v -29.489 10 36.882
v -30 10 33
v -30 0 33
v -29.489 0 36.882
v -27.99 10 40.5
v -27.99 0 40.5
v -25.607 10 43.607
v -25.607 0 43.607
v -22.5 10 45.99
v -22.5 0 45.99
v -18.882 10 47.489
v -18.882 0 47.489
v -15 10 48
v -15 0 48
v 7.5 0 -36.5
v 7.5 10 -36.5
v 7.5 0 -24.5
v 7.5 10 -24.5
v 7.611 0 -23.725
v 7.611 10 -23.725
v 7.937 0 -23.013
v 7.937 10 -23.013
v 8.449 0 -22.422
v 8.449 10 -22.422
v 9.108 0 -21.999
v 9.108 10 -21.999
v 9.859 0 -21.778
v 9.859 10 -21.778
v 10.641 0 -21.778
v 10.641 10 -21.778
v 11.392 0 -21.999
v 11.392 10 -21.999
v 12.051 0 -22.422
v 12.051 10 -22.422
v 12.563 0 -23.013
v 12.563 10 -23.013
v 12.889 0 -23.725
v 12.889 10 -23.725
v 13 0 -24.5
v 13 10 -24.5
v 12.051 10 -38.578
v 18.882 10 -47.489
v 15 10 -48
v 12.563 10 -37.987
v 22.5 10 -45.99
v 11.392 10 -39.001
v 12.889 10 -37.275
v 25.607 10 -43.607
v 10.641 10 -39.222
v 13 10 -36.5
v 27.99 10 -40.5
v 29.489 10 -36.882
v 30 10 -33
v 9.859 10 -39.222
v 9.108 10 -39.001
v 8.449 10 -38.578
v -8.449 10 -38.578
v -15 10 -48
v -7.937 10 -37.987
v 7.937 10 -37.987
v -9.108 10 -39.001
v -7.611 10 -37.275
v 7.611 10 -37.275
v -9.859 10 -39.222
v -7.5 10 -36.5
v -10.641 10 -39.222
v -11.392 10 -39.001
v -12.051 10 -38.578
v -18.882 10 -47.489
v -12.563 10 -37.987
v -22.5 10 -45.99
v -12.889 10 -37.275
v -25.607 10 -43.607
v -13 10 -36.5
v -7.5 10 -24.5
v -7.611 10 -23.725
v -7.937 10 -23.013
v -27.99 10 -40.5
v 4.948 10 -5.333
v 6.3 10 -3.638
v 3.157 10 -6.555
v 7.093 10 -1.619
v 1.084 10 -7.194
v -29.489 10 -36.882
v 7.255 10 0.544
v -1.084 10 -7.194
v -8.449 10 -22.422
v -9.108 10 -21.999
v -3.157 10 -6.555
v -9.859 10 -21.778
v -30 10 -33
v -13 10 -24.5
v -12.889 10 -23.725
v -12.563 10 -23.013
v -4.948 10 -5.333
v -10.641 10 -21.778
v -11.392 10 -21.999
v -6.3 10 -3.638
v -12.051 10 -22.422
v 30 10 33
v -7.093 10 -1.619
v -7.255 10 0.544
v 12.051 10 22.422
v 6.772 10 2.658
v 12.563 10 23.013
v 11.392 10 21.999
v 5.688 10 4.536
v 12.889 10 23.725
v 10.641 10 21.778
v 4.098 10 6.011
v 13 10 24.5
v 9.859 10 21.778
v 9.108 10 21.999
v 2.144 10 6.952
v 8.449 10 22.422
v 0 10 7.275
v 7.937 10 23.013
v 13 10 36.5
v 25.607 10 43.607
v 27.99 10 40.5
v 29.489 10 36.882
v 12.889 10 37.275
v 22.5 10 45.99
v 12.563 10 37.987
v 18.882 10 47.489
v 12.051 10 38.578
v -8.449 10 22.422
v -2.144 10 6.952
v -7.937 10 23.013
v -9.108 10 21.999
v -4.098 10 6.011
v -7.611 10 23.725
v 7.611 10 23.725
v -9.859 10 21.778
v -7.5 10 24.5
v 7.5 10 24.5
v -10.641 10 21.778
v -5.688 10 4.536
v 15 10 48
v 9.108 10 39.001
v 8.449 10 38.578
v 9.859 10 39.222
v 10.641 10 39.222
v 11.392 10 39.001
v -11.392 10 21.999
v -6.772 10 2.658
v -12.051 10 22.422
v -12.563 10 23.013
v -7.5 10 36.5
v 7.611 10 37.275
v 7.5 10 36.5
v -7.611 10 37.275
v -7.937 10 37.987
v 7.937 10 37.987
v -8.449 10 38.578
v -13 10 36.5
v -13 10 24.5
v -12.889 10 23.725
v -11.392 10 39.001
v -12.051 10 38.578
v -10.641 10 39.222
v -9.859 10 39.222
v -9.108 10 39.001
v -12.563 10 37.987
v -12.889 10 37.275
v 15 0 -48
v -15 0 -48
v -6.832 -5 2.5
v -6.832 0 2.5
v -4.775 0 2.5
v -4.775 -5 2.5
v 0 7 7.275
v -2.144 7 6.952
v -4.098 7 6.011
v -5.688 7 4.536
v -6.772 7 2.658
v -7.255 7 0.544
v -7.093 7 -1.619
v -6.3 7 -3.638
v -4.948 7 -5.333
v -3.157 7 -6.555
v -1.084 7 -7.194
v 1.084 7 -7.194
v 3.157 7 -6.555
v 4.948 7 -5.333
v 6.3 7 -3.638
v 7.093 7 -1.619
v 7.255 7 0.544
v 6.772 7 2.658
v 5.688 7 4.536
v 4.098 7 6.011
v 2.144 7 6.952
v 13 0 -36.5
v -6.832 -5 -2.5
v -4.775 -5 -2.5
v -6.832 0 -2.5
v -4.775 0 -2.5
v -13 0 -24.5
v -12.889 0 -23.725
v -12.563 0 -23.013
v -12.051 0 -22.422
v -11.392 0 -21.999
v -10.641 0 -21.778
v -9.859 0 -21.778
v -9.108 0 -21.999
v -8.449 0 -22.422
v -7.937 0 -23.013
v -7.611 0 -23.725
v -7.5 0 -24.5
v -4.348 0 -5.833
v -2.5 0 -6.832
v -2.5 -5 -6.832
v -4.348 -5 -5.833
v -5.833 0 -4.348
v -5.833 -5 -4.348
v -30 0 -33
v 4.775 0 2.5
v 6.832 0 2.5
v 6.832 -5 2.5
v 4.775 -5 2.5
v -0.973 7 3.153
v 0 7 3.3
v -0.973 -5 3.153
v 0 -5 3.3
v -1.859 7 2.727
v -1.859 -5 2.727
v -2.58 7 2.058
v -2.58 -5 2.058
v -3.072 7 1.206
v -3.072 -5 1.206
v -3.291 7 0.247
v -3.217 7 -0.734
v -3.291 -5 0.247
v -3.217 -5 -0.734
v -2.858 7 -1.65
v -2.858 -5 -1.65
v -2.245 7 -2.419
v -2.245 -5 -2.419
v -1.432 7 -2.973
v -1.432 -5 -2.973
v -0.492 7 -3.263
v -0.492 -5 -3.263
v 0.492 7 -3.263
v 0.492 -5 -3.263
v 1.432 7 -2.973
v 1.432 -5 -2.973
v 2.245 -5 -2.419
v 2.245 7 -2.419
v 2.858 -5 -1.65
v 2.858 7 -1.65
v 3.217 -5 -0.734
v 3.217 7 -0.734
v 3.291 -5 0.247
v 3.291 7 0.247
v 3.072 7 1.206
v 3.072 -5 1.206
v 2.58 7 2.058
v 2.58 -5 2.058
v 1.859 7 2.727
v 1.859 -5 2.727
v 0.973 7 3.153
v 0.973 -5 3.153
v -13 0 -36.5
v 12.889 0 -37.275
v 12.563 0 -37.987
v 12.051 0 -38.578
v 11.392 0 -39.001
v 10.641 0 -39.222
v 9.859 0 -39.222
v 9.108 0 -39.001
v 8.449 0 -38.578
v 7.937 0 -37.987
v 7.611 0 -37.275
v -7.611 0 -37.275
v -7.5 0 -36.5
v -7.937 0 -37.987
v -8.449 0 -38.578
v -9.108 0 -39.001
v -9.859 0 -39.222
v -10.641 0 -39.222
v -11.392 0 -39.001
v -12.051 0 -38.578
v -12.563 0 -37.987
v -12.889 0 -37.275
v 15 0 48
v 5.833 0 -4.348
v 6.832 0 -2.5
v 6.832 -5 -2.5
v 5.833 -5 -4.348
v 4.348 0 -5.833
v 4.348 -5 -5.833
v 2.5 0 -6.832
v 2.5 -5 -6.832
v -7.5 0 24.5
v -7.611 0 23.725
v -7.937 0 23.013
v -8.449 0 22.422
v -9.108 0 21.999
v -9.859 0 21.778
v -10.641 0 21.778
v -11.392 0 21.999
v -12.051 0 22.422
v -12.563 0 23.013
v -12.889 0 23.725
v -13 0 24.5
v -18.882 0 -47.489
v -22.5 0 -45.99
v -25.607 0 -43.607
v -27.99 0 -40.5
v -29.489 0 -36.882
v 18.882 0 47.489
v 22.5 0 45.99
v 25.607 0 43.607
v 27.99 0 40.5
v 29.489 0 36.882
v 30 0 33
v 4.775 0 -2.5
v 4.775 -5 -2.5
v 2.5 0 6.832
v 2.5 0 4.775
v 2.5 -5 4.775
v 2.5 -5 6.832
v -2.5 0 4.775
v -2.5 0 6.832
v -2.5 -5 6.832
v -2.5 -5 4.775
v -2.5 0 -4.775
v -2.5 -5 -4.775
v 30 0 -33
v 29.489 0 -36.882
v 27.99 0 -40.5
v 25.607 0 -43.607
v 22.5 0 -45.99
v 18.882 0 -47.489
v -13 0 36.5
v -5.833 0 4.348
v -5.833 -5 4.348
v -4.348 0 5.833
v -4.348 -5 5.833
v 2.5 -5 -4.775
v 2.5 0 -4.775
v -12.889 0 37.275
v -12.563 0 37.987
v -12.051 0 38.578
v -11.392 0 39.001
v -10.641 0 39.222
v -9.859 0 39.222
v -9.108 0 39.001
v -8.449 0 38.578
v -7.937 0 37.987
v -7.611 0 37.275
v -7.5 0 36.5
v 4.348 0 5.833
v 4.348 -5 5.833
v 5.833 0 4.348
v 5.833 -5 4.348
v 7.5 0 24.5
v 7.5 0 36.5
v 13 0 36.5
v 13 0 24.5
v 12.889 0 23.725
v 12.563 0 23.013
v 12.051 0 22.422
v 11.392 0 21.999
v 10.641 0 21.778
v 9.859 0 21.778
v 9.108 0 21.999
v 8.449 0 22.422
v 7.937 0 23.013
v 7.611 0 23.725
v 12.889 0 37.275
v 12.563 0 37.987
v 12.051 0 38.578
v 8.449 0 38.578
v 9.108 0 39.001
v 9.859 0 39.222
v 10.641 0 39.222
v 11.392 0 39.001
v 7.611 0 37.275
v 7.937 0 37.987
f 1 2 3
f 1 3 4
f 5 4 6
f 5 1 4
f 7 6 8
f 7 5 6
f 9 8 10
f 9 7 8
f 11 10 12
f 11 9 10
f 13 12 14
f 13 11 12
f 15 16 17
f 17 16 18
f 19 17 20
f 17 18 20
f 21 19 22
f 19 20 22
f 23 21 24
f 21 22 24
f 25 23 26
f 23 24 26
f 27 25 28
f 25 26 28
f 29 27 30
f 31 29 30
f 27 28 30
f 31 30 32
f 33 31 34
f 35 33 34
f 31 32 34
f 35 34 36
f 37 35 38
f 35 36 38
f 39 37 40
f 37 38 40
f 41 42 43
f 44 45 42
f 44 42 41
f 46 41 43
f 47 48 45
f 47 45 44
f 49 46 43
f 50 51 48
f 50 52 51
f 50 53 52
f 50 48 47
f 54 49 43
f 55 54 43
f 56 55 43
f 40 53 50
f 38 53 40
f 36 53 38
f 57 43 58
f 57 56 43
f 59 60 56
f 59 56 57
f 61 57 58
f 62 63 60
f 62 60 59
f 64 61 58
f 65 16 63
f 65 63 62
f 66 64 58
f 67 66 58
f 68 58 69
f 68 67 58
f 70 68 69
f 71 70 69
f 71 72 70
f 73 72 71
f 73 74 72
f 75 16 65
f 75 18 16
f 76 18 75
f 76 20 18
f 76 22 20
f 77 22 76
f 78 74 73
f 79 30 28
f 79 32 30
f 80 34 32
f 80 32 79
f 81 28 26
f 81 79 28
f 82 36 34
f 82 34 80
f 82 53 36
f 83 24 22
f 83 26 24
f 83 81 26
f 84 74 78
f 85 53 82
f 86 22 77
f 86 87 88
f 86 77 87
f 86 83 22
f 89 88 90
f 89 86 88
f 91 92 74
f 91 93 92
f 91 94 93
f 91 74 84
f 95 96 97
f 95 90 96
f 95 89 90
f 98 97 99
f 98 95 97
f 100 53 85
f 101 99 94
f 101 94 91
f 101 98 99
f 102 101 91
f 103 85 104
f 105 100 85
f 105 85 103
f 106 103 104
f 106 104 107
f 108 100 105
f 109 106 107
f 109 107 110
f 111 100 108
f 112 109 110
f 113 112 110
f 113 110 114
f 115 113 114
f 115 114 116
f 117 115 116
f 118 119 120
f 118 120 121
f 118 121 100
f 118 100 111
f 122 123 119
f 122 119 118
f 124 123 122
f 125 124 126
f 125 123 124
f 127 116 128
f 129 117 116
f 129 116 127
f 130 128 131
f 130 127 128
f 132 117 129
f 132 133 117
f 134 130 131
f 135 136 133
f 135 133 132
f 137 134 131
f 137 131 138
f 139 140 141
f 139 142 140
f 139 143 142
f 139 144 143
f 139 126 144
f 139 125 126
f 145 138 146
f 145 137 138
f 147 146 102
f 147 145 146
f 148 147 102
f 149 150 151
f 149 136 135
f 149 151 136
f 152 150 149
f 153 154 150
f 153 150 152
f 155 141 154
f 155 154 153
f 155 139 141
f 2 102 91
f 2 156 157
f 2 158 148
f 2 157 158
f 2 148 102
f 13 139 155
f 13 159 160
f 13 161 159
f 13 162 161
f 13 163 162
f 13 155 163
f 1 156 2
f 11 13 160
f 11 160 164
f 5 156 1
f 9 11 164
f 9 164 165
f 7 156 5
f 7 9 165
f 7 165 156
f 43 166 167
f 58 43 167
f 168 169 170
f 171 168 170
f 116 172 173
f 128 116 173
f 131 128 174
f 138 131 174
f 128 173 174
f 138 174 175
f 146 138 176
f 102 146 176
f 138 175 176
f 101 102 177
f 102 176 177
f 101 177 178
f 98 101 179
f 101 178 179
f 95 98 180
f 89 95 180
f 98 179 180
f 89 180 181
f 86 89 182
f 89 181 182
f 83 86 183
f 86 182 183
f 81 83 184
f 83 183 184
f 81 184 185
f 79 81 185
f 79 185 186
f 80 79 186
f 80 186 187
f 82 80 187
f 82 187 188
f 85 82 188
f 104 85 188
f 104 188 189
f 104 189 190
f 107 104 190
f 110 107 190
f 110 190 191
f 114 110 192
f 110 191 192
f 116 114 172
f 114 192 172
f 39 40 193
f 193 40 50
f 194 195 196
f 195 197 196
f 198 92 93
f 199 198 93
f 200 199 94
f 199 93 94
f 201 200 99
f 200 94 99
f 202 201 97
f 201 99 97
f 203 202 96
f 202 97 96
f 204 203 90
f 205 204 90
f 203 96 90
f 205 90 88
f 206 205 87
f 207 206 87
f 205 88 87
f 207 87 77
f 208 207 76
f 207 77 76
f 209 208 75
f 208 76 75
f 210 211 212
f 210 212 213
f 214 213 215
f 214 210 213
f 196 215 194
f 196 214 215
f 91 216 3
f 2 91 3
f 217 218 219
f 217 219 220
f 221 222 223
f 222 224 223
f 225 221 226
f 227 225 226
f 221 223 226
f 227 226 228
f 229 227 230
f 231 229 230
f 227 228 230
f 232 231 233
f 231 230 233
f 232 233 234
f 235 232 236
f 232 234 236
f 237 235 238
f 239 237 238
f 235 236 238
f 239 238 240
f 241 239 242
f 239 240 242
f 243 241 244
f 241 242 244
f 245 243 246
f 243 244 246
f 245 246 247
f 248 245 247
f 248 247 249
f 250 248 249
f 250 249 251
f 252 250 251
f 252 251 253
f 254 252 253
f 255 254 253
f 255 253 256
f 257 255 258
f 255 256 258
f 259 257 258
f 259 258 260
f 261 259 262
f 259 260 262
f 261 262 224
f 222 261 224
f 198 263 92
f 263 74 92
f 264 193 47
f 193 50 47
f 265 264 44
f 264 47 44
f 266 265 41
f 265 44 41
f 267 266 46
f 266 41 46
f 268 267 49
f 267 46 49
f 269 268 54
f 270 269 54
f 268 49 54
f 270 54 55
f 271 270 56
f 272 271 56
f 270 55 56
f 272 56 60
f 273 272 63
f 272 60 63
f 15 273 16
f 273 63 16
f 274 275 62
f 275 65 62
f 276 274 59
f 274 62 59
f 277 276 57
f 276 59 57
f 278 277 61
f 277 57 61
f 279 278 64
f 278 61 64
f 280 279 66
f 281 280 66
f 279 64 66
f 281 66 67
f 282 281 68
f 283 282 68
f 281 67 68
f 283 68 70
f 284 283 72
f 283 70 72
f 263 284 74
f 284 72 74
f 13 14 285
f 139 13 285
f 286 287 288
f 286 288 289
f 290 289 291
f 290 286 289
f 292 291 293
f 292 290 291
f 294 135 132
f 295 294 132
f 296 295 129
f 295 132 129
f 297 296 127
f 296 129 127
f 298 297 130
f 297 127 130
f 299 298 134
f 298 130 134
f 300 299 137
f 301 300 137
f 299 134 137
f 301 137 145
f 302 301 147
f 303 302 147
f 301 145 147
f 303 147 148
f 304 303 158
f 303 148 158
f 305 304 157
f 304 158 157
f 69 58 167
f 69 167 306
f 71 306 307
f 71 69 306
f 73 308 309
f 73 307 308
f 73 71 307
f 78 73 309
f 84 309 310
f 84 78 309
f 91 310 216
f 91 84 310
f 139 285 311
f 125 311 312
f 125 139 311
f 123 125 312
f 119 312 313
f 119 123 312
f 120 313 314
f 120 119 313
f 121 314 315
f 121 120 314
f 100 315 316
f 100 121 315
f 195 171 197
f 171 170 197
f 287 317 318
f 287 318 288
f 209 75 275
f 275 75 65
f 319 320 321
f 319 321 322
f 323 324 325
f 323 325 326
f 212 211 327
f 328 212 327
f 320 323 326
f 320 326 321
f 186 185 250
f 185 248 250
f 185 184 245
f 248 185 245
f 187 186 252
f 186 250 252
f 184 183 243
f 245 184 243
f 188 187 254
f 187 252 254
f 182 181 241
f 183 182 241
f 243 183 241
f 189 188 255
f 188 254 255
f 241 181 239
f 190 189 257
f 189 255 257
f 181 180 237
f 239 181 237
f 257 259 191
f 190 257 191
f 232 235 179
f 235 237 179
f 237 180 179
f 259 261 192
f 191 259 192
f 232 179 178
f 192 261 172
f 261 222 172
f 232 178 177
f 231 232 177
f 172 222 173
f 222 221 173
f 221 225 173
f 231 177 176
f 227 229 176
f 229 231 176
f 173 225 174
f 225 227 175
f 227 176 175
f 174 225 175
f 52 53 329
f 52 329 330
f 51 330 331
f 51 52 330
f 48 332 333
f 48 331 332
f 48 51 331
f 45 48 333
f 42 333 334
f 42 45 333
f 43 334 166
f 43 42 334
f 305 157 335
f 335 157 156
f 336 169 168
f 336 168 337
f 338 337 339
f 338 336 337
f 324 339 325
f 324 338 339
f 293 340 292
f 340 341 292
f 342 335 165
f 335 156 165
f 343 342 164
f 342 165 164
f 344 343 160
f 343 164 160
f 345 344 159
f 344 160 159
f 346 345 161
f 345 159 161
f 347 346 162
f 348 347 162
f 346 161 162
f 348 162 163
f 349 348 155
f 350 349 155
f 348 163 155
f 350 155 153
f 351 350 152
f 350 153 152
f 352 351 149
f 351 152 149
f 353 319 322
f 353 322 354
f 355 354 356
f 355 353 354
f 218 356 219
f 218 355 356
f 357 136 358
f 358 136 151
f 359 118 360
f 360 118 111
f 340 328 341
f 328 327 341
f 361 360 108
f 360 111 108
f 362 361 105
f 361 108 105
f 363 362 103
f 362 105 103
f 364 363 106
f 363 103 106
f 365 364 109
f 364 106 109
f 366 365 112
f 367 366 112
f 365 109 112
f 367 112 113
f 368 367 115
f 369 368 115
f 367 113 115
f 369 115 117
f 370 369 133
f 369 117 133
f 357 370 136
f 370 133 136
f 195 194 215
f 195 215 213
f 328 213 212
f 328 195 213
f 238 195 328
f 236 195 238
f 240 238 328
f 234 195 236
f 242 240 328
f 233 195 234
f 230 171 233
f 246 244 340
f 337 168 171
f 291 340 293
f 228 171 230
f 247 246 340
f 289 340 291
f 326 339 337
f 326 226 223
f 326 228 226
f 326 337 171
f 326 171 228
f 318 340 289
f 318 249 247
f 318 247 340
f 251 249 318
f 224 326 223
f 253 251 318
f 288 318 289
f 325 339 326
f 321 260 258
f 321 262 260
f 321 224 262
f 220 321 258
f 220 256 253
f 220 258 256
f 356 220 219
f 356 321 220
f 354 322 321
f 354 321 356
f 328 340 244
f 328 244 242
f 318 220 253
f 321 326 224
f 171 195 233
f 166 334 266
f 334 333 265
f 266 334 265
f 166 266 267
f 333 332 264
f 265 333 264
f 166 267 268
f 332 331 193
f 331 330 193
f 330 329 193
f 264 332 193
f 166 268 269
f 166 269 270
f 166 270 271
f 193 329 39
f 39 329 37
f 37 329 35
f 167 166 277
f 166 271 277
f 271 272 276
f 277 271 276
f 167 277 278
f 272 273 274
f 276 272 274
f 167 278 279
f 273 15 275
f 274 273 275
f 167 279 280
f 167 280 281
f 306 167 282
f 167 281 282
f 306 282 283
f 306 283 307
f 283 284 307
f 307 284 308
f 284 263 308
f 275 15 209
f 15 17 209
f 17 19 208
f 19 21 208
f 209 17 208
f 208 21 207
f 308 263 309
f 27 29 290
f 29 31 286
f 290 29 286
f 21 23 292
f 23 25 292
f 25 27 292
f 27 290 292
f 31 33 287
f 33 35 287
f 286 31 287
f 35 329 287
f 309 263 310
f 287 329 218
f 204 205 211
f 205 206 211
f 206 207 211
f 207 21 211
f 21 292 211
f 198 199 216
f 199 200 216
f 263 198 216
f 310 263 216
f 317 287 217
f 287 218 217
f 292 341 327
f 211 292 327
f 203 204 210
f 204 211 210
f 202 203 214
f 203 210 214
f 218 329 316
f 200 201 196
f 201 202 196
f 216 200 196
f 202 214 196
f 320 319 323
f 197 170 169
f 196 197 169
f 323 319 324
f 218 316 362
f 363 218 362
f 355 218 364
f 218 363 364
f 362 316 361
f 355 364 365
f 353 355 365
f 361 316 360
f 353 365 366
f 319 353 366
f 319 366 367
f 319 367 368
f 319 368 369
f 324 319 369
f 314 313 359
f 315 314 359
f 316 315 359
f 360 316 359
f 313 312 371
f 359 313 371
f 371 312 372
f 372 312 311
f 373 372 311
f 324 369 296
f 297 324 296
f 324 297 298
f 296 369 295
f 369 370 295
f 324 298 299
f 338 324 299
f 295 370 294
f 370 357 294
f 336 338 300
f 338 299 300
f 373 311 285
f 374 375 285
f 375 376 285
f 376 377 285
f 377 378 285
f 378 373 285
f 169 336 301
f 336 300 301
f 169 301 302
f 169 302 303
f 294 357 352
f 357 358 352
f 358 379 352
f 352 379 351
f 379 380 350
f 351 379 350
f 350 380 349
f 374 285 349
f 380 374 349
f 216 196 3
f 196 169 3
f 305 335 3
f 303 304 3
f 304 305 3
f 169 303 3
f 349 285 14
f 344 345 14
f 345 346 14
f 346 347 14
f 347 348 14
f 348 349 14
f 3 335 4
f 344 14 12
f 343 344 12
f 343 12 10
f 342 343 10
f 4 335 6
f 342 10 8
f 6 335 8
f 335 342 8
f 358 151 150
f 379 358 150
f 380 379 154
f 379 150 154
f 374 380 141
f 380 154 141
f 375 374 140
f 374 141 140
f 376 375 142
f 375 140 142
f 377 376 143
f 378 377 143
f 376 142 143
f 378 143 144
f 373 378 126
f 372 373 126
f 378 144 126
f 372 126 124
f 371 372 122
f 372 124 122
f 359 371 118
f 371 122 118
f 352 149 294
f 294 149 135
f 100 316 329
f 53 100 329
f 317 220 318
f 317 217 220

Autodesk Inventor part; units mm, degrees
ref_plane "YZ Plane" through (0, 0, 0) normal (1, 0, 0) x (0, 1, 0)
ref_plane "XZ Plane" through (0, 0, 0) normal (0, 1, 0) x (-1, 0, 0)
ref_plane "XY Plane" through (0, 0, 0) normal (0, 0, 1) x (1, 0, 0)
sketch "Sketch1" plane through (0, 0, 0) normal (0, 1, 0) x (-1, 0, 0)
  line L0 (30, 48) -> (-30, 48)
  line L1 (-30, 48) -> (-30, -48)
  line L2 (-30, -48) -> (30, -48)
  line L3 (30, -48) -> (30, 48)
  line L4 (30, 48) -> (-30, -48) construction
  line L5 (-30, 48) -> (30, -48) construction
  point P0 (0, 0)
  dimension "d0" = 60
  dimension "d1" = 96
extrude "Extrusion1" add sketch "Sketch1" along normal blind 10
sketch "Sketch2" plane through (0, 10, 0) normal (0, 1, 0) x (1, 0, 0)
  line L0 (13, -30.5) -> (13, 30.5) construction
  line L1 (13, 30.5) -> (-13, 30.5) construction
  line L2 (-13, 30.5) -> (-13, -30.5) construction
  line L3 (-13, -30.5) -> (13, -30.5) construction
  line L4 (13, -30.5) -> (-13, 30.5) construction
  line L5 (13, 30.5) -> (-13, -30.5) construction
  line L6 (-13, -30.5) -> (-10.25, -30.5)
  line L7 (-13, 30.5) -> (-10.25, 30.5)
  line L8 (13, -30.5) -> (10.25, -30.5) construction
  line L9 (13, 30.5) -> (10.25, 30.5)
  line L10 (10.25, -36.5) -> (10.25, -24.5) construction
  line L11 (13, -36.5) -> (13, -24.5)
  line L12 (7.5, -24.5) -> (7.5, -36.5)
  arc A0 (7.5, -36.5) -> (13, -36.5) centre (10.25, -36.5) ccw
  arc A1 (13, -24.5) -> (7.5, -24.5) centre (10.25, -24.5) ccw
  arc A2 (-13, -36.5) -> (-7.5, -36.5) centre (-10.25, -36.5) ccw
  line L13 (-13, -24.5) -> (-13, -36.5)
  line L14 (-7.5, -36.5) -> (-7.5, -24.5)
  arc A3 (-7.5, -24.5) -> (-13, -24.5) centre (-10.25, -24.5) ccw
  arc A4 (7.5, 24.5) -> (13, 24.5) centre (10.25, 24.5) ccw
  line L15 (7.5, 36.5) -> (7.5, 24.5)
  line L16 (13, 24.5) -> (13, 36.5)
  arc A5 (13, 36.5) -> (7.5, 36.5) centre (10.25, 36.5) ccw
  arc A6 (-13, 24.5) -> (-7.5, 24.5) centre (-10.25, 24.5) ccw
  line L17 (-13, 36.5) -> (-13, 24.5)
  line L18 (-7.5, 24.5) -> (-7.5, 36.5)
  arc A7 (-7.5, 36.5) -> (-13, 36.5) centre (-10.25, 36.5) ccw
  point P0 (0, 0)
  point P1 (0, 0)
  point P2 (0, 0)
  dimension "d17" = 61
  dimension "d16" = 26
  dimension "d13" = 2.75
  dimension "d15" = 2.75
  dimension "d12" = 2.75
  dimension "d14" = 2.75
  dimension "d11" = 6
  dimension "d10" = 5.5
  dimension "d8" = 6
  dimension "d9" = 5.5
  dimension "d6" = 6
  dimension "d7" = 5.5
  dimension "d4" = 6
  dimension "d5" = 5.5
extrude "Extrusion2" cut sketch "Sketch2" against normal through all
sketch "Sketch3" plane through (0, 0, 0) normal (0, -1, 0) x (1, 0, 0)
  circle A0 centre (0, 0) radius 7.275
  line L0 (7.275, 0) -> (-7.275, 0) construction
  line L1 (0, 7.275) -> (0, -7.275) construction
  line L2 (9.775, 2.5) -> (4.775, 2.5)
  line L3 (4.775, 2.5) -> (4.775, -2.5)
  line L4 (4.775, -2.5) -> (9.775, -2.5)
  line L5 (9.775, -2.5) -> (9.775, 2.5)
  line L6 (9.775, 2.5) -> (4.775, -2.5) construction
  line L7 (4.775, 2.5) -> (9.775, -2.5) construction
  line L8 (2.5, 9.775) -> (-2.5, 9.775)
  line L9 (-2.5, 9.775) -> (-2.5, 4.775)
  line L10 (-2.5, 4.775) -> (2.5, 4.775)
  line L11 (2.5, 4.775) -> (2.5, 9.775)
  line L12 (2.5, 9.775) -> (-2.5, 4.775) construction
  line L13 (-2.5, 9.775) -> (2.5, 4.775) construction
  line L14 (-9.775, 2.5) -> (-4.775, 2.5)
  line L15 (-4.775, 2.5) -> (-4.775, -2.5)
  line L16 (-4.775, -2.5) -> (-9.775, -2.5)
  line L17 (-9.775, -2.5) -> (-9.775, 2.5)
  line L18 (-9.775, 2.5) -> (-4.775, -2.5) construction
  line L19 (-4.775, 2.5) -> (-9.775, -2.5) construction
  line L20 (-2.5, -4.775) -> (2.5, -4.775)
  line L21 (2.5, -4.775) -> (2.5, -9.775)
  line L22 (2.5, -9.775) -> (-2.5, -9.775)
  line L23 (-2.5, -9.775) -> (-2.5, -4.775)
  line L24 (-2.5, -4.775) -> (2.5, -9.775) construction
  line L25 (2.5, -4.775) -> (-2.5, -9.775) construction
  point P0 (6.832, 2.5)
  point P1 (2.5, 6.832)
  point P2 (-2.5, 6.832)
  point P3 (-6.832, 2.5)
  point P4 (-6.832, -2.5)
  point P5 (-2.5, -6.832)
  point P6 (2.5, -6.832)
  point P7 (6.832, -2.5)
  dimension "d29" = 14.55
  dimension "d27" = 5
  dimension "d28" = 5
  dimension "d25" = 5
  dimension "d26" = 5
  dimension "d23" = 5
  dimension "d24" = 5
  dimension "d21" = 5
  dimension "d22" = 5
extrude "Extrusion3" add sketch "Sketch3" along normal blind 5 contours L2 L3 L4 A0 L21 L20 L23 L16 L15 L14 L9 L10 L11
sketch "Sketch4" plane through (0, 10, 0) normal (0, 1, 0) x (1, 0, 0)
  line L0 (13, -30.5) -> (13, 30.5) construction
  line L1 (13, 30.5) -> (-13, 30.5) construction
  line L2 (-13, 30.5) -> (-13, -30.5) construction
  line L3 (-13, -30.5) -> (13, -30.5) construction
  line L4 (13, -30.5) -> (-13, 30.5) construction
  line L5 (13, 30.5) -> (-13, -30.5) construction
  line L6 (-13, -30.5) -> (-10.25, -30.5)
  line L7 (-13, 30.5) -> (-10.25, 30.5)
  line L8 (13, -30.5) -> (10.25, -30.5) construction
  line L9 (13, 30.5) -> (10.25, 30.5)
  line L10 (10.25, -36.5) -> (10.25, -24.5) construction
  line L11 (13, -36.5) -> (13, -24.5)
  line L12 (7.5, -24.5) -> (7.5, -36.5)
  arc A0 (7.5, -36.5) -> (13, -36.5) centre (10.25, -36.5) ccw
  arc A1 (13, -24.5) -> (7.5, -24.5) centre (10.25, -24.5) ccw
  arc A2 (-13, -36.5) -> (-7.5, -36.5) centre (-10.25, -36.5) ccw
  line L13 (-13, -24.5) -> (-13, -36.5)
  line L14 (-7.5, -36.5) -> (-7.5, -24.5)
  arc A3 (-7.5, -24.5) -> (-13, -24.5) centre (-10.25, -24.5) ccw
  arc A4 (7.5, 24.5) -> (13, 24.5) centre (10.25, 24.5) ccw
  line L15 (7.5, 36.5) -> (7.5, 24.5)
  line L16 (13, 24.5) -> (13, 36.5)
  arc A5 (13, 36.5) -> (7.5, 36.5) centre (10.25, 36.5) ccw
  arc A6 (-13, 24.5) -> (-7.5, 24.5) centre (-10.25, 24.5) ccw
  line L17 (-13, 36.5) -> (-13, 24.5)
  line L18 (-7.5, 24.5) -> (-7.5, 36.5)
  arc A7 (-7.5, 36.5) -> (-13, 36.5) centre (-10.25, 36.5) ccw
  point P0 (0, 0)
  point P1 (0, 0)
  dimension "d47" = 61
  dimension "d46" = 26
  dimension "d45" = 2.75
  dimension "d44" = 2.75
  dimension "d43" = 2.75
  dimension "d42" = 2.75
  dimension "d41" = 6
  dimension "d40" = 5.5
  dimension "d38" = 6
  dimension "d39" = 5.5
  dimension "d36" = 6
  dimension "d37" = 5.5
  dimension "d34" = 6
  dimension "d35" = 5.5
hole "Hole1" at (0, 10, 0) direction (0, -1, 0) diameter 6.6 end through all counterbore diameter 14.55 counterbore depth 3
fillet "Fillet1" radius 15 4 edges at (30, 5, 48) (-30, 5, 48) (30, 5, -48) (-30, 5, -48)
properties part number "BaseRotationPlate" material "ABS Plastic"
